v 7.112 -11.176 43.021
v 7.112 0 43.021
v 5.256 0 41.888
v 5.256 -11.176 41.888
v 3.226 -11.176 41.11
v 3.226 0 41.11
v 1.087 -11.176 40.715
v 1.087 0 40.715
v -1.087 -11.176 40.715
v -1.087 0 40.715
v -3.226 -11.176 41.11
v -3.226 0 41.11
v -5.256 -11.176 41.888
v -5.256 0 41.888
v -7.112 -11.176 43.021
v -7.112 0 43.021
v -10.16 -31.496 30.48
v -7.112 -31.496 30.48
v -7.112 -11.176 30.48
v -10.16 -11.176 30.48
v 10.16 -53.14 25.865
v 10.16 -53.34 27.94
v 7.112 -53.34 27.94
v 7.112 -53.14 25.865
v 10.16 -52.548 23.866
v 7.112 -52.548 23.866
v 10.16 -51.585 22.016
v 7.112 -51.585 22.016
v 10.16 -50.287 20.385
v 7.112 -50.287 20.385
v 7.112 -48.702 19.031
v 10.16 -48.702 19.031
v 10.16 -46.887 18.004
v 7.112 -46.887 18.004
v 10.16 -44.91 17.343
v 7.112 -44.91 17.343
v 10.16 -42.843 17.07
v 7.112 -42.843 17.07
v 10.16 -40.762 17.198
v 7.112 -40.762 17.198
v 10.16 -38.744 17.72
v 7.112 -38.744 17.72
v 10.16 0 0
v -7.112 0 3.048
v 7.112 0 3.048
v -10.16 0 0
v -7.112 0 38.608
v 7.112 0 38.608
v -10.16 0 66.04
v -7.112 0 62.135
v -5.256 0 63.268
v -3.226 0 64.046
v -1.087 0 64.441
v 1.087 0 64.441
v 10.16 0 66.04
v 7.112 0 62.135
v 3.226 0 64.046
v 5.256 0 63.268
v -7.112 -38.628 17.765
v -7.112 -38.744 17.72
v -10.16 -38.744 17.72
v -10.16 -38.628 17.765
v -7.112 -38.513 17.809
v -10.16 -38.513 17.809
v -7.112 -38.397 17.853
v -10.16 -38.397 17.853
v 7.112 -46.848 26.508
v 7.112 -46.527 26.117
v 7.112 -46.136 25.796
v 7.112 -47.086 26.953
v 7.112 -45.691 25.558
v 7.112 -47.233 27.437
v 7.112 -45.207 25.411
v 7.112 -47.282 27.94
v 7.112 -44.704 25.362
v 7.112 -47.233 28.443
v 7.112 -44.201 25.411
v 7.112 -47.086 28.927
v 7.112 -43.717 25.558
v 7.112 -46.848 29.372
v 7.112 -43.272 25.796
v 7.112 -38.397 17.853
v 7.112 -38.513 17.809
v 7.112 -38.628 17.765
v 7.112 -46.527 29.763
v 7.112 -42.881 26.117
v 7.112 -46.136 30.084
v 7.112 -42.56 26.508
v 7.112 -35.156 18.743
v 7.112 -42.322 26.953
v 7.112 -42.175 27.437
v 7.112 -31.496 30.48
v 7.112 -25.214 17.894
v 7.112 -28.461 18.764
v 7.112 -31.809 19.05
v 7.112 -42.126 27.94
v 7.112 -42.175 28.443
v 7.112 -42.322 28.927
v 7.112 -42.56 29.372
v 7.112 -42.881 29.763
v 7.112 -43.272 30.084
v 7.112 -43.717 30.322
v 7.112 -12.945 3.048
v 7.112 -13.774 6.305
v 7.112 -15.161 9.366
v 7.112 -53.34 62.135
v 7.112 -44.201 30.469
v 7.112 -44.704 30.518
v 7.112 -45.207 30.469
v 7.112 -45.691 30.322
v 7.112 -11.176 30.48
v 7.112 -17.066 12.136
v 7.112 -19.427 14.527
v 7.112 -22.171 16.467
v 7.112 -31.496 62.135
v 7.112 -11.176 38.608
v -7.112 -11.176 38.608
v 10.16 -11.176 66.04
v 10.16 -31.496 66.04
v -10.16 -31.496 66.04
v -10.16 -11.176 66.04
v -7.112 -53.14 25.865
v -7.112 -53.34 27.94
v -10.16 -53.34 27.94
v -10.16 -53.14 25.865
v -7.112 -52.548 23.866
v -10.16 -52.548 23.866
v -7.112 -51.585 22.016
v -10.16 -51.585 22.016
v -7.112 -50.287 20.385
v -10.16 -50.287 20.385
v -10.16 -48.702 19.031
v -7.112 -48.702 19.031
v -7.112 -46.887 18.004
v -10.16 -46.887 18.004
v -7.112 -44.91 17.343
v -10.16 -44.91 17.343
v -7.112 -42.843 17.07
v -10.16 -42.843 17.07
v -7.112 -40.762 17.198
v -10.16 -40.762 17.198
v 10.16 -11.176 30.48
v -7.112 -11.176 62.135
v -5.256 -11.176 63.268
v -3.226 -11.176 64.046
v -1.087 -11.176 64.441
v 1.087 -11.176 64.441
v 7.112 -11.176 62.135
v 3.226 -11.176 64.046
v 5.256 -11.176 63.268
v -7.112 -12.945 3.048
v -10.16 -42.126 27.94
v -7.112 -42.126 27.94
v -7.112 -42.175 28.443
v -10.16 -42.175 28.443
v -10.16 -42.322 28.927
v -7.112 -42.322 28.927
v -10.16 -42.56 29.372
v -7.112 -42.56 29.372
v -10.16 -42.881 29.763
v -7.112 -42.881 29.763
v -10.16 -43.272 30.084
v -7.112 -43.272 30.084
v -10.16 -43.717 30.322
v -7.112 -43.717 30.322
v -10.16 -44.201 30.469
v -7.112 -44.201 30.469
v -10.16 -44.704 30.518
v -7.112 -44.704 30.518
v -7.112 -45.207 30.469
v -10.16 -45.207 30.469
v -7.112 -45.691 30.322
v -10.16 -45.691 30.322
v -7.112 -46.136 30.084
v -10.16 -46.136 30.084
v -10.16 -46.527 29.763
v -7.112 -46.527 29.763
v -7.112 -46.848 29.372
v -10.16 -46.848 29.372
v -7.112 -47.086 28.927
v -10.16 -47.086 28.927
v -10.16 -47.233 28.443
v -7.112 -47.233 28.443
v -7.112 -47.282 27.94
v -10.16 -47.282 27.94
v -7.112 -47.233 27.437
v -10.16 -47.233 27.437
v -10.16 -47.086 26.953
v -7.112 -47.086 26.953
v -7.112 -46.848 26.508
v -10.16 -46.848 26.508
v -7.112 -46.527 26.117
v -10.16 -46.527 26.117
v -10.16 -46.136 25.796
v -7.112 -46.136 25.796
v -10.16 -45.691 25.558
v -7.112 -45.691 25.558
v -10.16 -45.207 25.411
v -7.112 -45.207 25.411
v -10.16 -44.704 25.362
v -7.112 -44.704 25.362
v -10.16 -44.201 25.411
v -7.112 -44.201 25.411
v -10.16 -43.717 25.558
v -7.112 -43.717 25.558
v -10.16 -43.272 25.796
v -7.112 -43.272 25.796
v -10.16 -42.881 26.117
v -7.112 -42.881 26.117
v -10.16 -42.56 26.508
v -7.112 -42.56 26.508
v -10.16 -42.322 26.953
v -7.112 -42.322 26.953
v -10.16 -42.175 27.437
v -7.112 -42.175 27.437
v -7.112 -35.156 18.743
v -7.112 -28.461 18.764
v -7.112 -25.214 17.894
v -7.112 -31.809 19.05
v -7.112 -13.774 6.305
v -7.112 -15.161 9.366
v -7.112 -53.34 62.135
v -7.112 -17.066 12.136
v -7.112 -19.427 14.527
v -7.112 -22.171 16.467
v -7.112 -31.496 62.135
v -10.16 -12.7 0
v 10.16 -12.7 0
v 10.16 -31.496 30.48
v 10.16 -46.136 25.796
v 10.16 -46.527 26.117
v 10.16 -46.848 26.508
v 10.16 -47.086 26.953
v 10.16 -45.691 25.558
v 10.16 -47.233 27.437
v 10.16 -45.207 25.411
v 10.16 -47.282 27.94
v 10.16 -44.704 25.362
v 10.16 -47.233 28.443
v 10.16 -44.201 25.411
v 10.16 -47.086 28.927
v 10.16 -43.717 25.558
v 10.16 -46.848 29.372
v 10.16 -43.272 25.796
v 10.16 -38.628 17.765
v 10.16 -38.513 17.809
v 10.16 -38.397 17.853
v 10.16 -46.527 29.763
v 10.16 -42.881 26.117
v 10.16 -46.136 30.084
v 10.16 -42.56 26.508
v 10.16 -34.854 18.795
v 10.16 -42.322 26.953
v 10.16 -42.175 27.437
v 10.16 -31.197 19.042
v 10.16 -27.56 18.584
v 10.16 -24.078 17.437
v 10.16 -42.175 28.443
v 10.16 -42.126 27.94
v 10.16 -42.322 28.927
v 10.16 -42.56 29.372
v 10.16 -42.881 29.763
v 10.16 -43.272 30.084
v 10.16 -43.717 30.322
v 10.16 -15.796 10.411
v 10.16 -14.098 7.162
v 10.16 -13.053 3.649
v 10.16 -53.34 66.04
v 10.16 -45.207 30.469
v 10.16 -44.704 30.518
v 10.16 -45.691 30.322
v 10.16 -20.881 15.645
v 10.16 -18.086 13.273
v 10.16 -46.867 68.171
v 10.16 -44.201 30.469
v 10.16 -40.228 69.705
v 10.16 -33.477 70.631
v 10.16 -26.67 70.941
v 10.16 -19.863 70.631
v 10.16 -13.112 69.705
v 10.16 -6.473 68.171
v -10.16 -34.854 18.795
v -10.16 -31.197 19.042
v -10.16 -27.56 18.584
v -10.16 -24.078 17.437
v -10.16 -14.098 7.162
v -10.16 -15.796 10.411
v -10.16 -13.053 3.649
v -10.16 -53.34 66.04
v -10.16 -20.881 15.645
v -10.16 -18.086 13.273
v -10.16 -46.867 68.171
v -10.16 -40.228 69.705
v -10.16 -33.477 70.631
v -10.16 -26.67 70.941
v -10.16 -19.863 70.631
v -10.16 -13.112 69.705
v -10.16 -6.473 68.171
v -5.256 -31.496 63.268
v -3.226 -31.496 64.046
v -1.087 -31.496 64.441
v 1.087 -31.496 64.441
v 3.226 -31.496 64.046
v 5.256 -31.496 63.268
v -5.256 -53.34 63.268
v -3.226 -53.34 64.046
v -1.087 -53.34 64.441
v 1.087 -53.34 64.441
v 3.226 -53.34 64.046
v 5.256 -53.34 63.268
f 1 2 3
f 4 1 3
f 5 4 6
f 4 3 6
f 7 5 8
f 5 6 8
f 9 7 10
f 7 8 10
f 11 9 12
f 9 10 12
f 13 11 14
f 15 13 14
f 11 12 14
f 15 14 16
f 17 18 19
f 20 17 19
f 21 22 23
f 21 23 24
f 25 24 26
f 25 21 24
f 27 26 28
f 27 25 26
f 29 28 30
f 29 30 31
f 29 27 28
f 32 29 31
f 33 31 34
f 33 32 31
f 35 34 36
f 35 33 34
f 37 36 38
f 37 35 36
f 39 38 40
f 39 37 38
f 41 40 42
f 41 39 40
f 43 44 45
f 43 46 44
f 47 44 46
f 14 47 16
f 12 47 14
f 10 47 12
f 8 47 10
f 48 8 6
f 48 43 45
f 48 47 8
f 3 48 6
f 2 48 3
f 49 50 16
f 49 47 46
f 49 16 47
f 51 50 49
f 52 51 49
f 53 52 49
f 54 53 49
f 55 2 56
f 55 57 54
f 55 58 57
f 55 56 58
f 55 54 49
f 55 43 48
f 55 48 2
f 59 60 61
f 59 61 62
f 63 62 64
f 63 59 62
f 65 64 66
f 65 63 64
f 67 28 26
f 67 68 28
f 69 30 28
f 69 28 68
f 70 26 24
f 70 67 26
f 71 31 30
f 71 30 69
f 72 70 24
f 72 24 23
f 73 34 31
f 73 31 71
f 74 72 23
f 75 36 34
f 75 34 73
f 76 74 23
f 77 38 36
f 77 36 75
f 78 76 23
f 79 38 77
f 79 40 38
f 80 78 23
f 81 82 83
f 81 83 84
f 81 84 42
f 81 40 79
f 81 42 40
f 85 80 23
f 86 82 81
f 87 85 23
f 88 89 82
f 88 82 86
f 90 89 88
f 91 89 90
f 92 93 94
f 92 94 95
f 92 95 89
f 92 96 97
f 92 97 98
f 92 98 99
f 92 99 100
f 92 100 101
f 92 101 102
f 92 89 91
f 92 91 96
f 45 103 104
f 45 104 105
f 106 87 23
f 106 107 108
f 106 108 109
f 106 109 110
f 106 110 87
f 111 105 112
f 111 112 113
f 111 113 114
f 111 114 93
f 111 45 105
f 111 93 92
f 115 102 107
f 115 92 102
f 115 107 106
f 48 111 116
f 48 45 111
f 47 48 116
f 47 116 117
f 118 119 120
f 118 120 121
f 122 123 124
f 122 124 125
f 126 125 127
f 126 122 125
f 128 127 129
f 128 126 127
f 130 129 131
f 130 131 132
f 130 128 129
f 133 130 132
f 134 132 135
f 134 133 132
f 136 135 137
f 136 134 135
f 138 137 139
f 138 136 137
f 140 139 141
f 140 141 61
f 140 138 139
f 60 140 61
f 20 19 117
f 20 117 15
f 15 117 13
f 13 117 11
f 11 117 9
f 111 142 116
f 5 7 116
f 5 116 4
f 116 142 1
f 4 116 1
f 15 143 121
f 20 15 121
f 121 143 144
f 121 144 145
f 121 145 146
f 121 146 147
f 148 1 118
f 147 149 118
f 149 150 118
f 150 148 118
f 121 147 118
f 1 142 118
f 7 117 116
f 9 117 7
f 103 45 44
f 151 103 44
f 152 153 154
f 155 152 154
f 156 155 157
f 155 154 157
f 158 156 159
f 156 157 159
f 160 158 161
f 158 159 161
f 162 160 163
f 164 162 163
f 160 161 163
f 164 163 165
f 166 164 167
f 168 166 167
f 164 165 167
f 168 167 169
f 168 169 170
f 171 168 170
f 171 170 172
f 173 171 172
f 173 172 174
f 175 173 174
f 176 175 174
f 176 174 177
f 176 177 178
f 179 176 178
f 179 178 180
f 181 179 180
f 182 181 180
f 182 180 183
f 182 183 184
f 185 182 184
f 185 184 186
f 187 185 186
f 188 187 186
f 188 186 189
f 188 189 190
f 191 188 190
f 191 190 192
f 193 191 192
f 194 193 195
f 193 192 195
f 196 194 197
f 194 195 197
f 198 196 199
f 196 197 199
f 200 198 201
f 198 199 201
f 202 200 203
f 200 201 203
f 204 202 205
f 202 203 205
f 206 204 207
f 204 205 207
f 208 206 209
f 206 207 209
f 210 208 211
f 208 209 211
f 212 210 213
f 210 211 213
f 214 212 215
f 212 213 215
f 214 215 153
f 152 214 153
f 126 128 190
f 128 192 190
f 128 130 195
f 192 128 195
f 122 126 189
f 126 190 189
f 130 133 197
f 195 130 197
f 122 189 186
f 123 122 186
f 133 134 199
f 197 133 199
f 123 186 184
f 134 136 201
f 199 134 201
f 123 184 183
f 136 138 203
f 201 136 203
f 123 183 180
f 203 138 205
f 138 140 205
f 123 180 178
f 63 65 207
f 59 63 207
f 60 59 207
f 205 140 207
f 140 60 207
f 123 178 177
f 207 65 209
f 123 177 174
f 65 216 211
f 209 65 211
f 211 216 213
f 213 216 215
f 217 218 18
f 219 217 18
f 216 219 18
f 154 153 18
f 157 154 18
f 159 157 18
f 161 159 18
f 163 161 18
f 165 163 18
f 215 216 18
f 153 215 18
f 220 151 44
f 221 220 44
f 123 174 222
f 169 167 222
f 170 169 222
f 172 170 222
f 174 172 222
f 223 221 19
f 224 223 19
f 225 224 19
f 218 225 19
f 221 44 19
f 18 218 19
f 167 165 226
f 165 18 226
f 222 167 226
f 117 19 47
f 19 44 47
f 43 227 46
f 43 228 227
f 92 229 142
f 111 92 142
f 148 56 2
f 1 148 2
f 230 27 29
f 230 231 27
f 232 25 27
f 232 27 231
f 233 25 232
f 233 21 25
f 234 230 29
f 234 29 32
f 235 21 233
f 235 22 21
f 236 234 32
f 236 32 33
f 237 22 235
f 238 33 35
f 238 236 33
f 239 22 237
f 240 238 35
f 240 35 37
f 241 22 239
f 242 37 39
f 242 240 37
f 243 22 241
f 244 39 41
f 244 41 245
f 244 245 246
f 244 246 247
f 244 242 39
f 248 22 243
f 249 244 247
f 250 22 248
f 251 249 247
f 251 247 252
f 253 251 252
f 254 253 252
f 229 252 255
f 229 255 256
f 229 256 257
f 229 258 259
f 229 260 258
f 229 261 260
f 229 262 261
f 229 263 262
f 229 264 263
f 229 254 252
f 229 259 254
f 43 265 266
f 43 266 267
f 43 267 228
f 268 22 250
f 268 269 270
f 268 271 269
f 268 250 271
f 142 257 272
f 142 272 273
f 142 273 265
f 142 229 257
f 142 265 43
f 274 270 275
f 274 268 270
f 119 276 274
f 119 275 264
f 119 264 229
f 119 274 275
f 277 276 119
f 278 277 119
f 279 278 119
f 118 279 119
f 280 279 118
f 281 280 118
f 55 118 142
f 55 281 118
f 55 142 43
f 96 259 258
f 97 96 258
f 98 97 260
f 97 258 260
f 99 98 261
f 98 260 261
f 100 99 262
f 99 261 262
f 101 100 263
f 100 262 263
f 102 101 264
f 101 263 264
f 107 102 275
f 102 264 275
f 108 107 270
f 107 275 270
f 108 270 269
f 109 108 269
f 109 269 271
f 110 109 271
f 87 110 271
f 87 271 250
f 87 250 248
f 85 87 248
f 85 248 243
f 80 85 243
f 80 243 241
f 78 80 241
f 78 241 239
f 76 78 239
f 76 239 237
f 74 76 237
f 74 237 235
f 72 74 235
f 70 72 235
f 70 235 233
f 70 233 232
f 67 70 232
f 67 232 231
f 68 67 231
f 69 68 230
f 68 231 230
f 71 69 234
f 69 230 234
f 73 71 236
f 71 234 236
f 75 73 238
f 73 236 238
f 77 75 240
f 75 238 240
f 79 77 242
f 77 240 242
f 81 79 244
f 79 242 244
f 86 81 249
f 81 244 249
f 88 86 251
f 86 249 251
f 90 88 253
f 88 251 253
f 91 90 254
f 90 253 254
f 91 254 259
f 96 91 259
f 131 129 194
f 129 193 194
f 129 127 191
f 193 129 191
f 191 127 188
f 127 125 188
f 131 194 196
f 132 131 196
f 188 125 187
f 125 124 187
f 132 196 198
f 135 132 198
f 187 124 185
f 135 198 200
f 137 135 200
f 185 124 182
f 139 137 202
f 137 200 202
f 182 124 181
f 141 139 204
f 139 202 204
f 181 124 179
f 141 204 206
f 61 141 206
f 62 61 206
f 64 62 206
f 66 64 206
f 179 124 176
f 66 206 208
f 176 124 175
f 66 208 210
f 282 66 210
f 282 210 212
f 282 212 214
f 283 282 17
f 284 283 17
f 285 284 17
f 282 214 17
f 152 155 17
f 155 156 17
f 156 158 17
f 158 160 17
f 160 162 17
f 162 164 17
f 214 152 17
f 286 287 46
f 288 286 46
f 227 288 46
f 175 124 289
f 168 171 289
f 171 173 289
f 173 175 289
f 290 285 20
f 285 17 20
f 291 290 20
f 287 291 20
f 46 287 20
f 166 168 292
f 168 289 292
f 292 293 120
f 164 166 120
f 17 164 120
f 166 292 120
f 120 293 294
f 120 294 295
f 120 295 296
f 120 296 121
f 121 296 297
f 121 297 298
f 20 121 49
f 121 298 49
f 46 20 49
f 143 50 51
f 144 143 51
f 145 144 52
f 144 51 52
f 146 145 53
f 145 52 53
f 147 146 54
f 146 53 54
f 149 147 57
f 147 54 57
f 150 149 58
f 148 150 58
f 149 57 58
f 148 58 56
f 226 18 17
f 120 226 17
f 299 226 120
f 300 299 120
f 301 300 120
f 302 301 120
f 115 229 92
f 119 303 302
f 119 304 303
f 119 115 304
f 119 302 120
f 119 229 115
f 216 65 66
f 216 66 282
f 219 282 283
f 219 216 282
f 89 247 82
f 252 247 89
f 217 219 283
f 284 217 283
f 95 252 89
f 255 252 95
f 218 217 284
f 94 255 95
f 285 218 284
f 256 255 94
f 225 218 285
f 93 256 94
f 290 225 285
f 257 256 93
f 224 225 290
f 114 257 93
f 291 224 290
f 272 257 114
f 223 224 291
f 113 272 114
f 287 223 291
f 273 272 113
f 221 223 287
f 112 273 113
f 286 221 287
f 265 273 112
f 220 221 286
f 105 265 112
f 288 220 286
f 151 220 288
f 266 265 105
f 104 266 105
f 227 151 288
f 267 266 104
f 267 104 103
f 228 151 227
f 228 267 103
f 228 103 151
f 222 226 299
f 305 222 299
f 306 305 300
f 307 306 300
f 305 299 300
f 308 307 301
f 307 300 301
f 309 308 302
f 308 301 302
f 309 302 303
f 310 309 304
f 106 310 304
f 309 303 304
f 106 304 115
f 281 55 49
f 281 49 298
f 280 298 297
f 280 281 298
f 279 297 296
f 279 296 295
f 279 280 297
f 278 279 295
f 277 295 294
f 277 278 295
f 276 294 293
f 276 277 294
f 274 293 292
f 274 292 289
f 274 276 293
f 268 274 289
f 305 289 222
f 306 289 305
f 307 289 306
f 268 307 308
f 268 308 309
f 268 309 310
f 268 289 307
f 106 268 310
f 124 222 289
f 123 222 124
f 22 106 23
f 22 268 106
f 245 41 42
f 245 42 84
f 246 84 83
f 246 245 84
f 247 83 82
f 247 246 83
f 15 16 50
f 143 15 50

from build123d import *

# Parameters (mm, degrees)
F1_DEPTH      = 10.16
F1_DEPTH_BACK = 10.16
F2_W          = 20.32
F2_H          = 35.56
F2_R          = 2.5781
F3_DEPTH      = 25.4
F4_W          = 14.224
F4_H          = 35.56
F5_DEPTH      = 54.61
F7_DEPTH      = 25.4


with BuildPart() as f1:
    # F0 (on Right) → F1 (new body, two sides)
    with BuildSketch(Plane.YZ) as f1_sk:
        with BuildLine():
            Line((-12.7, 0), (0, 0))
            Line((0, 0), (0, 66.04))
            ThreePointArc((0, 66.04), (-26.67, 70.940694), (-53.34, 66.04))
            Line((-53.34, 66.04), (-53.34, 27.94))
            ThreePointArc((-53.34, 27.94), (-48.702079, 19.030695), (-38.743793, 17.719745))
            ThreePointArc((-38.743793, 17.719745), (-38.570599, 17.787128), (-38.396755, 17.852819))
            ThreePointArc((-38.396755, 17.852819), (-20.880736, 15.644858), (-12.7, 0))
        make_face()
    extrude(amount=F1_DEPTH)
    extrude(f1_sk.sketch, amount=-F1_DEPTH_BACK)

    # F2 (on face) → F3 (cut)
    with BuildSketch(Plane.YZ.offset(10.16)):
        with Locations((-21.336, 48.26)):
            Rectangle(F2_W, F2_H)
        with Locations((-44.704, 27.94)):
            Circle(F2_R)
    extrude(amount=-F3_DEPTH, mode=Mode.SUBTRACT)

    # F4 (on face) → F5 (cut)
    with BuildSketch(Plane(origin=(0, 0, 0), x_dir=(-1, 0, 0), z_dir=(0, 1, 0))):
        with BuildLine():
            Line((7.112, 43.021353), (7.112, 62.134647))
            ThreePointArc((7.112, 62.134647), (0, 64.4906), (-7.112, 62.134647))
            Line((-7.112, 62.134647), (-7.112, 43.021353))
            ThreePointArc((-7.112, 43.021353), (0, 40.6654), (7.112, 43.021353))
        make_face()
        with Locations((0, 20.828)):
            Rectangle(F4_W, F4_H)
    extrude(amount=-F5_DEPTH, mode=Mode.SUBTRACT)

    # F6 (on face) → F7 (cut)
    with BuildSketch(Plane.XZ.offset(53.34)):
        with BuildLine():
            Line((-7.112, 43.443549), (-7.112, 38.608))
            Line((-7.112, 38.608), (7.112, 38.608))
            Line((7.112, 38.608), (7.112, 43.443549))
            ThreePointArc((7.112, 43.443549), (0, 41.004444), (-7.112, 43.443549))
        make_face()
    extrude(amount=-F7_DEPTH, mode=Mode.SUBTRACT)


solid = f1.part
